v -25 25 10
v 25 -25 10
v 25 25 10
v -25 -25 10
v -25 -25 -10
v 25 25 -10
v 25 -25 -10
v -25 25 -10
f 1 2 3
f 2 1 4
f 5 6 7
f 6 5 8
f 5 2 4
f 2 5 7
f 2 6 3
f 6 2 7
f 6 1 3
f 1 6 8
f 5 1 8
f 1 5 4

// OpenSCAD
// Parameters
body_length = 50; //[25:100:1]
body_width  = 50; //[25:100:1]
body_height = 20; //[10:40:1]

eps = 0.01;

// Main Body Module
module main_body() {
  color([0.85, 0.85, 0.8])
    cube([body_length, body_width, body_height], center=true);
}

// Final Model (single connected solid, centered at origin for reliable viewing)
union() {
  main_body();
}
